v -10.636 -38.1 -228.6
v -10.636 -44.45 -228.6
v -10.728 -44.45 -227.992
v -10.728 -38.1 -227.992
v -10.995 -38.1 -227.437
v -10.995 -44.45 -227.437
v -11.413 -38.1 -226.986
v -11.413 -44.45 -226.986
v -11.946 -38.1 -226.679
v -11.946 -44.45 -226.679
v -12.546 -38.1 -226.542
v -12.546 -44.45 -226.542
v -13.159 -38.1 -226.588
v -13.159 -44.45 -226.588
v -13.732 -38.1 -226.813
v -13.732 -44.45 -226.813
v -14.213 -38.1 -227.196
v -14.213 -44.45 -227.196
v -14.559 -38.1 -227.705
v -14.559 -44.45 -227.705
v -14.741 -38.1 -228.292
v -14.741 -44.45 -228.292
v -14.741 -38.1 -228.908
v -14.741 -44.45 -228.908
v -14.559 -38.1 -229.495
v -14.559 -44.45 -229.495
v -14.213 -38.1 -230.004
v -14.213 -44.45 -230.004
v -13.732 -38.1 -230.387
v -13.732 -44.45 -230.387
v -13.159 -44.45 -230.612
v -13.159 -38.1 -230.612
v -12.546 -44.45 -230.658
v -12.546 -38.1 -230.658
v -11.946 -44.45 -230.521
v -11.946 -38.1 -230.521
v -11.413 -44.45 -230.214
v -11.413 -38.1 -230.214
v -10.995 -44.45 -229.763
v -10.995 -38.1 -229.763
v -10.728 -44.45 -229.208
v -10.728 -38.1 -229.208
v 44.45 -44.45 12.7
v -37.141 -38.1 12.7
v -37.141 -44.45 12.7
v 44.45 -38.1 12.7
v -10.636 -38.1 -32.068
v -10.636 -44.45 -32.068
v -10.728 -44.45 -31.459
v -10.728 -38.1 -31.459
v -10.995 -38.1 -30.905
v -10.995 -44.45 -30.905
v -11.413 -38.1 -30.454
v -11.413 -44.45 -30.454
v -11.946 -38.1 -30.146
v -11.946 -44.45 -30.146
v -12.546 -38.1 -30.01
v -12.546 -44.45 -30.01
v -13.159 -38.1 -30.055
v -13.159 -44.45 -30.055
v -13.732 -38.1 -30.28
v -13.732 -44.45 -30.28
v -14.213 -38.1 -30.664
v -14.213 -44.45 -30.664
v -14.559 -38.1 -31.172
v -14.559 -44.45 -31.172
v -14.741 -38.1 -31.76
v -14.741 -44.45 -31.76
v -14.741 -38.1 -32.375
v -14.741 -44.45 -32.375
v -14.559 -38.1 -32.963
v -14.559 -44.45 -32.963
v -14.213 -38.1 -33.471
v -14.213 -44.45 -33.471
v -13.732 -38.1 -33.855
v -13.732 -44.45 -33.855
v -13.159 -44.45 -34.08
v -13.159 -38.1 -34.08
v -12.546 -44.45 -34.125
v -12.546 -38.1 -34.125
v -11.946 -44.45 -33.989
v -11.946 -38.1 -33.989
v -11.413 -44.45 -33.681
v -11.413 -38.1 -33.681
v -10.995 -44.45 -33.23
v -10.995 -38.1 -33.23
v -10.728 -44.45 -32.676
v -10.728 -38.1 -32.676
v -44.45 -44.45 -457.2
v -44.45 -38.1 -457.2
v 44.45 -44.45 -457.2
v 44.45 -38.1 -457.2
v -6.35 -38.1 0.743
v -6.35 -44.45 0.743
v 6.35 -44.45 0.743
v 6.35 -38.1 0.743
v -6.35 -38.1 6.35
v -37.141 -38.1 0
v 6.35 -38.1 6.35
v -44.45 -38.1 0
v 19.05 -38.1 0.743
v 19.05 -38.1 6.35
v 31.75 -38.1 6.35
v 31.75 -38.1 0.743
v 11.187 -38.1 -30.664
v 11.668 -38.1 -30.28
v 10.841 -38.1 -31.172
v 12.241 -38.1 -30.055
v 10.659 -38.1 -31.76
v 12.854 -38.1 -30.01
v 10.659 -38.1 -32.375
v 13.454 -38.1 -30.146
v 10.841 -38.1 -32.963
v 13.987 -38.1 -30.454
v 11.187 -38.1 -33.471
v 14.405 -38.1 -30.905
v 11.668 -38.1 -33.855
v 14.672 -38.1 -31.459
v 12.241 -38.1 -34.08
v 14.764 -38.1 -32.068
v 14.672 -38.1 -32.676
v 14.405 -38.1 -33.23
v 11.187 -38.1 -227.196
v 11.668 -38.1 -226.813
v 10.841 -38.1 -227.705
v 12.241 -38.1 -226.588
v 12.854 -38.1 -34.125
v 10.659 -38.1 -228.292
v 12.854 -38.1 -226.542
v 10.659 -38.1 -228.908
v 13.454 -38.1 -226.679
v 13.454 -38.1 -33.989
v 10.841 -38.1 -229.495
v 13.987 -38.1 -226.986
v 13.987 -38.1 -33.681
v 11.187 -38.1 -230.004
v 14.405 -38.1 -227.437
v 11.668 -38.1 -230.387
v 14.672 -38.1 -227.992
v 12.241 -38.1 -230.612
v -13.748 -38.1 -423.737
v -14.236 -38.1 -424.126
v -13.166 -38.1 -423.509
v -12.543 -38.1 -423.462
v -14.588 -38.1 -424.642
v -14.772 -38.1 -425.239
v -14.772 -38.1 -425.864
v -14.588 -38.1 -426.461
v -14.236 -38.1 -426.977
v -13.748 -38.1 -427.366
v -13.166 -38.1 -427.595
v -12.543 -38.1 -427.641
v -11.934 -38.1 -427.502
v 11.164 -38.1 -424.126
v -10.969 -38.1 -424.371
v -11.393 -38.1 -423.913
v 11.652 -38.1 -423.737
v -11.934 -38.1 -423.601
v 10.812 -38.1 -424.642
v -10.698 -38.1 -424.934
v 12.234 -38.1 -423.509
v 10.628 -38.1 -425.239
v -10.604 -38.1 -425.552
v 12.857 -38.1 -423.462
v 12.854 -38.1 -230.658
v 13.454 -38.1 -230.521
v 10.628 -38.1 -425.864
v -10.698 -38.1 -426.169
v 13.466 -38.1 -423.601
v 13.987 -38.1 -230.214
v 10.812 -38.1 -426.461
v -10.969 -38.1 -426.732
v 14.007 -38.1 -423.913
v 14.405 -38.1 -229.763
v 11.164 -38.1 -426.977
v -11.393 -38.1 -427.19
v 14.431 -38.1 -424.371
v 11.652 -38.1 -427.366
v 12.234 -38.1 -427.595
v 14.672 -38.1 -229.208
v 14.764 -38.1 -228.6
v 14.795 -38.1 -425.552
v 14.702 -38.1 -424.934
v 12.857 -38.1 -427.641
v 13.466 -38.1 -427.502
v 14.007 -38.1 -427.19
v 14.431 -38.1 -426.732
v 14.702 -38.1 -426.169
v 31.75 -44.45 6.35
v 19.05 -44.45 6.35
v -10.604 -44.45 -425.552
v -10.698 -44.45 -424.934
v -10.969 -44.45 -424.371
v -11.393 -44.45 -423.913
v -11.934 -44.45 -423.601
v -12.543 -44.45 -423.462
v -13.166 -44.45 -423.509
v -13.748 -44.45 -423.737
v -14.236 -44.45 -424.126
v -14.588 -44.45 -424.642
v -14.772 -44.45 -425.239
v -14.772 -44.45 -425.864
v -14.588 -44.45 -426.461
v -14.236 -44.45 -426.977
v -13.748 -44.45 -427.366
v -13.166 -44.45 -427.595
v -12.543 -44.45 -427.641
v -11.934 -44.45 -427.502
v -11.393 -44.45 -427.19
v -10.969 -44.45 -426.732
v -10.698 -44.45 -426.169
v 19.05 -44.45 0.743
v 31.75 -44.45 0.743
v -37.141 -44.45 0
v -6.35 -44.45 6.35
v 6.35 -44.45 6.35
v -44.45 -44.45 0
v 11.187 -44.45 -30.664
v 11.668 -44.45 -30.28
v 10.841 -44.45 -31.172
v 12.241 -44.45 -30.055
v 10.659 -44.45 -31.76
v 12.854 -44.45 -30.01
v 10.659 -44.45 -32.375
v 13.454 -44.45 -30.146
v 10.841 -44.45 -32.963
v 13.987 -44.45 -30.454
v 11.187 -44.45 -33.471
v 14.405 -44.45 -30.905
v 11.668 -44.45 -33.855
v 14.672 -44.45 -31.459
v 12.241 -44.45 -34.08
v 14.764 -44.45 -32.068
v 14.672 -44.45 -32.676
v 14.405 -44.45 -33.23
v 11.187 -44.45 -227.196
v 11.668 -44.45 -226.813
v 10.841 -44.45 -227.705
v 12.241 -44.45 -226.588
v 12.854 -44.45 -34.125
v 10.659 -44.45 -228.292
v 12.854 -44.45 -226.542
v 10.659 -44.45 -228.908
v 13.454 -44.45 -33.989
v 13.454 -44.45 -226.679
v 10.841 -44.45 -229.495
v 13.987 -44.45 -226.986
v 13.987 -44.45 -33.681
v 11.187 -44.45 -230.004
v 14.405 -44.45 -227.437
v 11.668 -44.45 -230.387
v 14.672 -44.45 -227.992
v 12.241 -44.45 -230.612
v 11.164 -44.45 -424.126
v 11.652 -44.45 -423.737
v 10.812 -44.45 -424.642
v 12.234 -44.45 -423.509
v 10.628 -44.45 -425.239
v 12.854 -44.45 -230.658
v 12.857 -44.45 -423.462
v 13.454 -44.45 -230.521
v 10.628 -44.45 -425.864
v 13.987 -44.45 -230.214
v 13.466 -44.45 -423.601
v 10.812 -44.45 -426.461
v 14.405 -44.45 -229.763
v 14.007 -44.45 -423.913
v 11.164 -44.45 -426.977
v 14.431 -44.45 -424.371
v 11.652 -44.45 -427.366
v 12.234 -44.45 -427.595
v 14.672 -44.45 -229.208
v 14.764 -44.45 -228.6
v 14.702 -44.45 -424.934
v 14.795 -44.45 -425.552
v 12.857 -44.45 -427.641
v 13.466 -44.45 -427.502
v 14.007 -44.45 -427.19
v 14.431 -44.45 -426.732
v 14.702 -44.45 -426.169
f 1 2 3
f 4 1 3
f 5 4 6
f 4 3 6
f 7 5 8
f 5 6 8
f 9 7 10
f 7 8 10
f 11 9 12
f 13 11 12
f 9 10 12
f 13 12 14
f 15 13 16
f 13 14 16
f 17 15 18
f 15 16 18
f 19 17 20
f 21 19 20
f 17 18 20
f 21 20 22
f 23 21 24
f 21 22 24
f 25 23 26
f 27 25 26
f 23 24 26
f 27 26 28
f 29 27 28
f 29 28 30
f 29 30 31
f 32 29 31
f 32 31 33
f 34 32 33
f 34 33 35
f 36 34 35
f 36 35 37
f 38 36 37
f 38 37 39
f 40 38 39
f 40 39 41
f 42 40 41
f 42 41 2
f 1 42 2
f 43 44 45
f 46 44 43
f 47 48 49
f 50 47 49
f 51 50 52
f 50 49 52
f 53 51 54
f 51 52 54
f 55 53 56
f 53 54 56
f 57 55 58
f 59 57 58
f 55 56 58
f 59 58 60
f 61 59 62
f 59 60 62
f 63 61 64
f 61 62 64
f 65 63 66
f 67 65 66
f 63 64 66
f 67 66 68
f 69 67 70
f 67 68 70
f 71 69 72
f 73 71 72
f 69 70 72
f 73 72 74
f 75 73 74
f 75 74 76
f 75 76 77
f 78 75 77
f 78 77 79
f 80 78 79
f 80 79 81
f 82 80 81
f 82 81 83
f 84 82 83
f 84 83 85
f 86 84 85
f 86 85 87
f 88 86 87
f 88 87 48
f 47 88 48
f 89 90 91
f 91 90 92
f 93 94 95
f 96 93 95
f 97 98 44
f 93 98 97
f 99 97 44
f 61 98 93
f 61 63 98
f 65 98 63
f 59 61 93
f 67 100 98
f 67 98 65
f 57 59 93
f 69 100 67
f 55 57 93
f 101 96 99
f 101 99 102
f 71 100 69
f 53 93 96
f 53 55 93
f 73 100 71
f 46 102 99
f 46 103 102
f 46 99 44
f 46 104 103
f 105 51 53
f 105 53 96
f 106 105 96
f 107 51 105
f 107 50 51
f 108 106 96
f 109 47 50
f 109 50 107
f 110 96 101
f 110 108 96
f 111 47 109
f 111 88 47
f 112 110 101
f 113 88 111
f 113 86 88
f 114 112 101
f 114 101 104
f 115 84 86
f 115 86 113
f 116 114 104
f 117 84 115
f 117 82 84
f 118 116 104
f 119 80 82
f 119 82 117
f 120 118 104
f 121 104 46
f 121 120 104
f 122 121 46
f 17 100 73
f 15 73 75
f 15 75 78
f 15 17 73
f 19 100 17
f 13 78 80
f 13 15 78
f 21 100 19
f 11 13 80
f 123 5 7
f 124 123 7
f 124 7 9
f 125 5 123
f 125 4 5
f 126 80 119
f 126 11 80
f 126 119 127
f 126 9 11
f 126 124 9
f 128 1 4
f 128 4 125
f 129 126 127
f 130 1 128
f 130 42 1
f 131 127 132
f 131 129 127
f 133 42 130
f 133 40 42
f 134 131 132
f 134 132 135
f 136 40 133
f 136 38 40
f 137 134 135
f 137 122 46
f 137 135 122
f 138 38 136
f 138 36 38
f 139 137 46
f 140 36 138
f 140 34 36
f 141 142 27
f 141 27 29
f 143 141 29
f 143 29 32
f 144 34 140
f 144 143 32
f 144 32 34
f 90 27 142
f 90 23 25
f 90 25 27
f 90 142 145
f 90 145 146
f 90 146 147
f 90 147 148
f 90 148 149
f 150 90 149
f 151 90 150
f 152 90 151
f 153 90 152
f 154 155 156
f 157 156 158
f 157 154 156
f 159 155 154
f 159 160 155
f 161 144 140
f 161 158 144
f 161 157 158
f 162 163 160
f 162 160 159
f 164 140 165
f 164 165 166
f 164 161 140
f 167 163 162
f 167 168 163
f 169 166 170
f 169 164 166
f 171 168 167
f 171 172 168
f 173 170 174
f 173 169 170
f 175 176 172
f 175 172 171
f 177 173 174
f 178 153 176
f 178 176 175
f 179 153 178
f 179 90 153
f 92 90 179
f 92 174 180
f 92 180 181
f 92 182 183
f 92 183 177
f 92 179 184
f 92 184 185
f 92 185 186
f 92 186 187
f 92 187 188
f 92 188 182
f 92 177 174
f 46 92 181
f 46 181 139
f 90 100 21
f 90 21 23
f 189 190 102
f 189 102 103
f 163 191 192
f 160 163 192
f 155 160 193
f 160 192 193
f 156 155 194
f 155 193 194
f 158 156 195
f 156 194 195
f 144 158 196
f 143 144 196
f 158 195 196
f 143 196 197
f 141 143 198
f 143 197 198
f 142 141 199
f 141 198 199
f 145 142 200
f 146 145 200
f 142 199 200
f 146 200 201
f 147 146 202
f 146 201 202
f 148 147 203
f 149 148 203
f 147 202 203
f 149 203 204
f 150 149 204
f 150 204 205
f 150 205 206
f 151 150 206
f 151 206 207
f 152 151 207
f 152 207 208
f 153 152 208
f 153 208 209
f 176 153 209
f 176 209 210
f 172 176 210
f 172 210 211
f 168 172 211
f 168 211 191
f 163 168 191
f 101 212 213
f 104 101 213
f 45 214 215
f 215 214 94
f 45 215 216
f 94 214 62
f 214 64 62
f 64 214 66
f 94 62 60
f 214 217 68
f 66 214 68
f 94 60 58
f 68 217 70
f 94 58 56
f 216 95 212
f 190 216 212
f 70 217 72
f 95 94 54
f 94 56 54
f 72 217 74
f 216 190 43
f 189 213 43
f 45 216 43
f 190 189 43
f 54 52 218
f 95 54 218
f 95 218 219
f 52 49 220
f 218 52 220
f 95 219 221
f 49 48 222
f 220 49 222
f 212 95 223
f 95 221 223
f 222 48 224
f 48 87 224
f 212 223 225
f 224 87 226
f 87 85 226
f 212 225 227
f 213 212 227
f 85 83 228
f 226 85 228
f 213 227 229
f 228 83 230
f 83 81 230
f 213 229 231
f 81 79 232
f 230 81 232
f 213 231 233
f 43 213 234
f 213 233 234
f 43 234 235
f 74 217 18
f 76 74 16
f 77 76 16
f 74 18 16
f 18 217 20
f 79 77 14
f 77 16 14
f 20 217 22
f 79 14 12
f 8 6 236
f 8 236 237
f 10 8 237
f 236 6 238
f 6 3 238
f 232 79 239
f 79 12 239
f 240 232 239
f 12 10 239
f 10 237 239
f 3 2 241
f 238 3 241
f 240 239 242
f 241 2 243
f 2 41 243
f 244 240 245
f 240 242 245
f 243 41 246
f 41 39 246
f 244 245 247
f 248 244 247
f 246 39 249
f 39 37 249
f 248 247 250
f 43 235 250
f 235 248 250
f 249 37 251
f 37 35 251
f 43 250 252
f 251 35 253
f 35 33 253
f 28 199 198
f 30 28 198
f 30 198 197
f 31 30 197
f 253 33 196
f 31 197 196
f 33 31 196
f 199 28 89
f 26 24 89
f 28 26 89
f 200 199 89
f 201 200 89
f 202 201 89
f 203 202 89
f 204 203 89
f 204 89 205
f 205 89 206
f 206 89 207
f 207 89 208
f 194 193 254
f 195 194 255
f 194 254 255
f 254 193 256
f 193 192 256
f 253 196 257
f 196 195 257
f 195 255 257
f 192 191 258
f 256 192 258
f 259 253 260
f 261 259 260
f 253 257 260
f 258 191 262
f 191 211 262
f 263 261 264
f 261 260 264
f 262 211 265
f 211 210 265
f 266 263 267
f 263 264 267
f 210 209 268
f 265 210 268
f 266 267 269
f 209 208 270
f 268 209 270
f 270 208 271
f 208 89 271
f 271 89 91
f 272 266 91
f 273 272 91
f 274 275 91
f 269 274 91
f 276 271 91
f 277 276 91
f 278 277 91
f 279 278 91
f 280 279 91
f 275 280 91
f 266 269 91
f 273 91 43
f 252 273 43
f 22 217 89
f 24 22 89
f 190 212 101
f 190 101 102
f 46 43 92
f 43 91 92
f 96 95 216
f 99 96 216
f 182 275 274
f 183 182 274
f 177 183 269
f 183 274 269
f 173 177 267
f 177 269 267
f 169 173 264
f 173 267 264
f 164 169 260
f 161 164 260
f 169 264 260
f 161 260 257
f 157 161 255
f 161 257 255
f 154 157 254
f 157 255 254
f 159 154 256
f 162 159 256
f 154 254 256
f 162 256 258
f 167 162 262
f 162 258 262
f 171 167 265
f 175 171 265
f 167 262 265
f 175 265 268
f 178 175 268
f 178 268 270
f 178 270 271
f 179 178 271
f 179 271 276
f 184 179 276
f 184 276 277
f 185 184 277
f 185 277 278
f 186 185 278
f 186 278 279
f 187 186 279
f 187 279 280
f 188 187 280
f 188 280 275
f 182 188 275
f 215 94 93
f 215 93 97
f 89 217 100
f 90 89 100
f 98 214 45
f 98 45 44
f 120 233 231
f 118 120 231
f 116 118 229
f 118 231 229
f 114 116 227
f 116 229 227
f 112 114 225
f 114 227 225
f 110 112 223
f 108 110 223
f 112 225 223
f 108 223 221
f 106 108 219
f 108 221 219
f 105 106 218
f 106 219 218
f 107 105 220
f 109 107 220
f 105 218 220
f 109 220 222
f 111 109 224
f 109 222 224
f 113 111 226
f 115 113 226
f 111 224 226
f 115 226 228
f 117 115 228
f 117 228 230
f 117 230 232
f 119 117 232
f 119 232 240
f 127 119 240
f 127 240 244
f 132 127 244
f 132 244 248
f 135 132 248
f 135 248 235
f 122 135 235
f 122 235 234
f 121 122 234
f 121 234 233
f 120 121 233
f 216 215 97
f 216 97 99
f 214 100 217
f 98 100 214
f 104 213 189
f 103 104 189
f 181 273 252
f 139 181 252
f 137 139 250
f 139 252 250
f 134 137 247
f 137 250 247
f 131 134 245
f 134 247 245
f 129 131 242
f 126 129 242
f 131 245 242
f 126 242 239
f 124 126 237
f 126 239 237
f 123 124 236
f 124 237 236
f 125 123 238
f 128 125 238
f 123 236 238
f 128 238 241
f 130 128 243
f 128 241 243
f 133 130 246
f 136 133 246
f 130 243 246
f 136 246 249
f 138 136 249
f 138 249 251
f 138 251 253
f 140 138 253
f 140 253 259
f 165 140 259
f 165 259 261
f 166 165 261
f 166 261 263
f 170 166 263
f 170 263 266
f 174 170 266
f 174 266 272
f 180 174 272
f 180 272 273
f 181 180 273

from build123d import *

# Parameters (mm, degrees)
SKETCH1_W           = 88.9
SKETCH1_H           = 6.35
BOSS_EXTRUDE1_DEPTH = 457.2
SKETCH2_R           = 2.06375
CUT_EXTRUDE1_DEPTH  = 460.399570091
SKETCH3_R           = 2.0955
CUT_EXTRUDE2_DEPTH  = 460.399570091
SKETCH4_W           = 81.59065151
SKETCH4_H           = 6.35
BOSS_EXTRUDE2_DEPTH = 12.7
SKETCH5_W           = 12.7
SKETCH5_H           = 5.60664933
CUT_EXTRUDE3_DEPTH  = 12.7


with BuildPart() as part:
    # Sketch1 → Boss-Extrude1 (new body)
    with BuildSketch(Plane.XY):
        with Locations((0, -41.275)):
            Rectangle(SKETCH1_W, SKETCH1_H)
    extrude(amount=-BOSS_EXTRUDE1_DEPTH)

    # Sketch2 → Cut-Extrude1 (cut, through all)
    with BuildSketch(Plane.XZ.offset(44.45)):
        with Locations((-12.7, -228.6)):
            Circle(SKETCH2_R)
        with Locations((12.7, -228.6)):
            Circle(SKETCH2_R)
        with Locations((-12.7, -32.0675)):
            Circle(SKETCH2_R)
        with Locations((12.7, -32.0675)):
            Circle(SKETCH2_R)
    extrude(amount=-CUT_EXTRUDE1_DEPTH, mode=Mode.SUBTRACT)

    # Sketch3 → Cut-Extrude2 (cut, through all)
    with BuildSketch(Plane(origin=(0, -44.45, 0), x_dir=(-1, 0, 0), z_dir=(0, -1, 0))):
        with Locations(Location((12.7, 425.5516, 0), (0, 0, 180))):
            Circle(SKETCH3_R)
        with Locations(Location((-12.7, 425.5516, 0), (0, 0, 180))):
            Circle(SKETCH3_R)
    extrude(amount=-CUT_EXTRUDE2_DEPTH, mode=Mode.SUBTRACT)

    # Sketch4 → Boss-Extrude2 (add)
    with BuildSketch(Plane.XY):
        with Locations((3.654674245, -41.275)):
            Rectangle(SKETCH4_W, SKETCH4_H)
    extrude(amount=BOSS_EXTRUDE2_DEPTH)

    # Sketch5 → Cut-Extrude3 (cut)
    with BuildSketch(Plane.XZ.offset(44.45)):
        with Locations((25.4, 3.546675335)):
            Rectangle(SKETCH5_W, SKETCH5_H)
        with Locations((0, 3.546675335)):
            Rectangle(SKETCH5_W, SKETCH5_H)
    extrude(amount=-CUT_EXTRUDE3_DEPTH, mode=Mode.SUBTRACT)


solid = part.part
